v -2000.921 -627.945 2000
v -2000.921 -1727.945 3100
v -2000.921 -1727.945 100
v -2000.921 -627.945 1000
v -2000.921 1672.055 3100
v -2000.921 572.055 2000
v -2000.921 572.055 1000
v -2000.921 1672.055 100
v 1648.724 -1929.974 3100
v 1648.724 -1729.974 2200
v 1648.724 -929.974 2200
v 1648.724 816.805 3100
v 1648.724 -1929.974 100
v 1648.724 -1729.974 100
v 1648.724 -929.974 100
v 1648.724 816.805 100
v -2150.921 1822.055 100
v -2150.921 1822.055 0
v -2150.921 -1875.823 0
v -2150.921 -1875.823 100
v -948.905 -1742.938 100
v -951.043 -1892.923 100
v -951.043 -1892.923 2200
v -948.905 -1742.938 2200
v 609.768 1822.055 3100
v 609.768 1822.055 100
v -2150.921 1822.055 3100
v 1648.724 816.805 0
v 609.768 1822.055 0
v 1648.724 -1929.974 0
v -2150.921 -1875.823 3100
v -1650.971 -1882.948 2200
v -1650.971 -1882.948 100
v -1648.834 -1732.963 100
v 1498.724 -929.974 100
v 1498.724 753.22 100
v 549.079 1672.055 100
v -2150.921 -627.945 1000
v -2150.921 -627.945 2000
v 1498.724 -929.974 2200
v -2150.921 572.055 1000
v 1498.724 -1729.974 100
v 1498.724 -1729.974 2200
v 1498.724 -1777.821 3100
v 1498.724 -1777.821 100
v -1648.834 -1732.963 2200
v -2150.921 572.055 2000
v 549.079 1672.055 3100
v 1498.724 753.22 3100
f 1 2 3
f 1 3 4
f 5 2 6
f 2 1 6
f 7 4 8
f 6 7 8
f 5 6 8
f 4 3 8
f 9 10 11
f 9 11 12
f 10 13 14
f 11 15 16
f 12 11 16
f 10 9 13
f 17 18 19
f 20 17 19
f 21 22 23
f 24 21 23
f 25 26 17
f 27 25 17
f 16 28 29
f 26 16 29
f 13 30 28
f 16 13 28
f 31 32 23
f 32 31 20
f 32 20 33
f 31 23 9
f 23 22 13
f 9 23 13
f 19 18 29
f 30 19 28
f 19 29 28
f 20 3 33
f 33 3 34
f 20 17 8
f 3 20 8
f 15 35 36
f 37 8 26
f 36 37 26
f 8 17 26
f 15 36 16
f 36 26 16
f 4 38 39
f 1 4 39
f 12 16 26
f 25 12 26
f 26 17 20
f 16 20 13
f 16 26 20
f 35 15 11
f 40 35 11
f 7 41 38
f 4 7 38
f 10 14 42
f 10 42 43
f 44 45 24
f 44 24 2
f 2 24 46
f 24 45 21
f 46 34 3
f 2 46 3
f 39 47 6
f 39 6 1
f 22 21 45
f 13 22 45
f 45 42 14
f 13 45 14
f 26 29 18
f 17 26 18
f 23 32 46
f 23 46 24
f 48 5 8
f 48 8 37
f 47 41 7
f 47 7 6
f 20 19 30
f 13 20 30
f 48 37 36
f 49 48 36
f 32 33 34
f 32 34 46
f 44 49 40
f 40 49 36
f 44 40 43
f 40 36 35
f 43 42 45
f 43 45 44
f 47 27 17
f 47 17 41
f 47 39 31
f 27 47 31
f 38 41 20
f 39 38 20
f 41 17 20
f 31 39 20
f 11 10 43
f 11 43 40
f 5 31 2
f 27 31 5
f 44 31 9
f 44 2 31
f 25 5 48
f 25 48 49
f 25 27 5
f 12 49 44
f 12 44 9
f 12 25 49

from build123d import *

# Parameters (mm, degrees)
F1_DEPTH = 100
F3_DEPTH = 3000
F4_W     = 700
F4_H     = 2100
F5_DEPTH = 150
F6_W     = 800
F6_H     = 2100
F7_DEPTH = 150
F8_W     = 1200
F8_H     = 1000
F9_DEPTH = 150


with BuildPart() as f1:
    # F0 (on Top) → F1 (new body)
    with BuildSketch(Plane.XY):
        Polygon((1648.7238958032, 816.8053367971), (609.7675009533, 1822.0548629761), (-2150.9207091177, 1822.0548629761), (-2150.9207091177, -1875.8225996028), (1648.7238958032, -1929.9743792834), align=None)
    extrude(amount=F1_DEPTH)


with BuildPart() as f3:
    # F2 (on face) → F3 (new body)
    with BuildSketch(Plane.XY.offset(100)):
        Polygon((609.7675009533, 1822.0548629761), (-2150.9207091177, 1822.0548629761), (-2150.9207091177, -1875.8225996028), (1648.7238958032, -1929.9743792834), (1648.7238958032, 816.8053367971), align=None)
        Polygon((-2000.9207091177, -1727.9451370239), (-2000.9207091177, 1672.0548629761), (549.0792908823, 1672.0548629761), (1498.7238958032, 753.2195837793), (1498.7238958032, -1777.8213763335), align=None, mode=Mode.SUBTRACT)
    extrude(amount=F3_DEPTH)

    # F4 (on face) → F5 (cut, through all)
    with BuildSketch(Plane(origin=(-27.1652149759, -1906.0899407813, 0), x_dir=(0.9998984585, -0.0142503541, 0), z_dir=(-0.0142503541, -0.9998984585, 0))):
        with Locations((-1273.9711652562, 1150)):
            Rectangle(F4_W, F4_H)
    extrude(amount=-F5_DEPTH, mode=Mode.SUBTRACT)

    # F6 (on face) → F7 (cut, through all)
    with BuildSketch(Plane.YZ.offset(1648.7238958032)):
        with Locations((-1329.9743792834, 1150)):
            Rectangle(F6_W, F6_H)
    extrude(amount=-F7_DEPTH, mode=Mode.SUBTRACT)

    # F8 (on face) → F9 (cut, through all)
    with BuildSketch(Plane(origin=(-2150.9207091177, 0, 0), x_dir=(0, -1, 0), z_dir=(-1, 0, 0))):
        with Locations((27.9451370239, 1500)):
            Rectangle(F8_W, F8_H)
    extrude(amount=-F9_DEPTH, mode=Mode.SUBTRACT)


solid = Compound([f1.part, f3.part])
